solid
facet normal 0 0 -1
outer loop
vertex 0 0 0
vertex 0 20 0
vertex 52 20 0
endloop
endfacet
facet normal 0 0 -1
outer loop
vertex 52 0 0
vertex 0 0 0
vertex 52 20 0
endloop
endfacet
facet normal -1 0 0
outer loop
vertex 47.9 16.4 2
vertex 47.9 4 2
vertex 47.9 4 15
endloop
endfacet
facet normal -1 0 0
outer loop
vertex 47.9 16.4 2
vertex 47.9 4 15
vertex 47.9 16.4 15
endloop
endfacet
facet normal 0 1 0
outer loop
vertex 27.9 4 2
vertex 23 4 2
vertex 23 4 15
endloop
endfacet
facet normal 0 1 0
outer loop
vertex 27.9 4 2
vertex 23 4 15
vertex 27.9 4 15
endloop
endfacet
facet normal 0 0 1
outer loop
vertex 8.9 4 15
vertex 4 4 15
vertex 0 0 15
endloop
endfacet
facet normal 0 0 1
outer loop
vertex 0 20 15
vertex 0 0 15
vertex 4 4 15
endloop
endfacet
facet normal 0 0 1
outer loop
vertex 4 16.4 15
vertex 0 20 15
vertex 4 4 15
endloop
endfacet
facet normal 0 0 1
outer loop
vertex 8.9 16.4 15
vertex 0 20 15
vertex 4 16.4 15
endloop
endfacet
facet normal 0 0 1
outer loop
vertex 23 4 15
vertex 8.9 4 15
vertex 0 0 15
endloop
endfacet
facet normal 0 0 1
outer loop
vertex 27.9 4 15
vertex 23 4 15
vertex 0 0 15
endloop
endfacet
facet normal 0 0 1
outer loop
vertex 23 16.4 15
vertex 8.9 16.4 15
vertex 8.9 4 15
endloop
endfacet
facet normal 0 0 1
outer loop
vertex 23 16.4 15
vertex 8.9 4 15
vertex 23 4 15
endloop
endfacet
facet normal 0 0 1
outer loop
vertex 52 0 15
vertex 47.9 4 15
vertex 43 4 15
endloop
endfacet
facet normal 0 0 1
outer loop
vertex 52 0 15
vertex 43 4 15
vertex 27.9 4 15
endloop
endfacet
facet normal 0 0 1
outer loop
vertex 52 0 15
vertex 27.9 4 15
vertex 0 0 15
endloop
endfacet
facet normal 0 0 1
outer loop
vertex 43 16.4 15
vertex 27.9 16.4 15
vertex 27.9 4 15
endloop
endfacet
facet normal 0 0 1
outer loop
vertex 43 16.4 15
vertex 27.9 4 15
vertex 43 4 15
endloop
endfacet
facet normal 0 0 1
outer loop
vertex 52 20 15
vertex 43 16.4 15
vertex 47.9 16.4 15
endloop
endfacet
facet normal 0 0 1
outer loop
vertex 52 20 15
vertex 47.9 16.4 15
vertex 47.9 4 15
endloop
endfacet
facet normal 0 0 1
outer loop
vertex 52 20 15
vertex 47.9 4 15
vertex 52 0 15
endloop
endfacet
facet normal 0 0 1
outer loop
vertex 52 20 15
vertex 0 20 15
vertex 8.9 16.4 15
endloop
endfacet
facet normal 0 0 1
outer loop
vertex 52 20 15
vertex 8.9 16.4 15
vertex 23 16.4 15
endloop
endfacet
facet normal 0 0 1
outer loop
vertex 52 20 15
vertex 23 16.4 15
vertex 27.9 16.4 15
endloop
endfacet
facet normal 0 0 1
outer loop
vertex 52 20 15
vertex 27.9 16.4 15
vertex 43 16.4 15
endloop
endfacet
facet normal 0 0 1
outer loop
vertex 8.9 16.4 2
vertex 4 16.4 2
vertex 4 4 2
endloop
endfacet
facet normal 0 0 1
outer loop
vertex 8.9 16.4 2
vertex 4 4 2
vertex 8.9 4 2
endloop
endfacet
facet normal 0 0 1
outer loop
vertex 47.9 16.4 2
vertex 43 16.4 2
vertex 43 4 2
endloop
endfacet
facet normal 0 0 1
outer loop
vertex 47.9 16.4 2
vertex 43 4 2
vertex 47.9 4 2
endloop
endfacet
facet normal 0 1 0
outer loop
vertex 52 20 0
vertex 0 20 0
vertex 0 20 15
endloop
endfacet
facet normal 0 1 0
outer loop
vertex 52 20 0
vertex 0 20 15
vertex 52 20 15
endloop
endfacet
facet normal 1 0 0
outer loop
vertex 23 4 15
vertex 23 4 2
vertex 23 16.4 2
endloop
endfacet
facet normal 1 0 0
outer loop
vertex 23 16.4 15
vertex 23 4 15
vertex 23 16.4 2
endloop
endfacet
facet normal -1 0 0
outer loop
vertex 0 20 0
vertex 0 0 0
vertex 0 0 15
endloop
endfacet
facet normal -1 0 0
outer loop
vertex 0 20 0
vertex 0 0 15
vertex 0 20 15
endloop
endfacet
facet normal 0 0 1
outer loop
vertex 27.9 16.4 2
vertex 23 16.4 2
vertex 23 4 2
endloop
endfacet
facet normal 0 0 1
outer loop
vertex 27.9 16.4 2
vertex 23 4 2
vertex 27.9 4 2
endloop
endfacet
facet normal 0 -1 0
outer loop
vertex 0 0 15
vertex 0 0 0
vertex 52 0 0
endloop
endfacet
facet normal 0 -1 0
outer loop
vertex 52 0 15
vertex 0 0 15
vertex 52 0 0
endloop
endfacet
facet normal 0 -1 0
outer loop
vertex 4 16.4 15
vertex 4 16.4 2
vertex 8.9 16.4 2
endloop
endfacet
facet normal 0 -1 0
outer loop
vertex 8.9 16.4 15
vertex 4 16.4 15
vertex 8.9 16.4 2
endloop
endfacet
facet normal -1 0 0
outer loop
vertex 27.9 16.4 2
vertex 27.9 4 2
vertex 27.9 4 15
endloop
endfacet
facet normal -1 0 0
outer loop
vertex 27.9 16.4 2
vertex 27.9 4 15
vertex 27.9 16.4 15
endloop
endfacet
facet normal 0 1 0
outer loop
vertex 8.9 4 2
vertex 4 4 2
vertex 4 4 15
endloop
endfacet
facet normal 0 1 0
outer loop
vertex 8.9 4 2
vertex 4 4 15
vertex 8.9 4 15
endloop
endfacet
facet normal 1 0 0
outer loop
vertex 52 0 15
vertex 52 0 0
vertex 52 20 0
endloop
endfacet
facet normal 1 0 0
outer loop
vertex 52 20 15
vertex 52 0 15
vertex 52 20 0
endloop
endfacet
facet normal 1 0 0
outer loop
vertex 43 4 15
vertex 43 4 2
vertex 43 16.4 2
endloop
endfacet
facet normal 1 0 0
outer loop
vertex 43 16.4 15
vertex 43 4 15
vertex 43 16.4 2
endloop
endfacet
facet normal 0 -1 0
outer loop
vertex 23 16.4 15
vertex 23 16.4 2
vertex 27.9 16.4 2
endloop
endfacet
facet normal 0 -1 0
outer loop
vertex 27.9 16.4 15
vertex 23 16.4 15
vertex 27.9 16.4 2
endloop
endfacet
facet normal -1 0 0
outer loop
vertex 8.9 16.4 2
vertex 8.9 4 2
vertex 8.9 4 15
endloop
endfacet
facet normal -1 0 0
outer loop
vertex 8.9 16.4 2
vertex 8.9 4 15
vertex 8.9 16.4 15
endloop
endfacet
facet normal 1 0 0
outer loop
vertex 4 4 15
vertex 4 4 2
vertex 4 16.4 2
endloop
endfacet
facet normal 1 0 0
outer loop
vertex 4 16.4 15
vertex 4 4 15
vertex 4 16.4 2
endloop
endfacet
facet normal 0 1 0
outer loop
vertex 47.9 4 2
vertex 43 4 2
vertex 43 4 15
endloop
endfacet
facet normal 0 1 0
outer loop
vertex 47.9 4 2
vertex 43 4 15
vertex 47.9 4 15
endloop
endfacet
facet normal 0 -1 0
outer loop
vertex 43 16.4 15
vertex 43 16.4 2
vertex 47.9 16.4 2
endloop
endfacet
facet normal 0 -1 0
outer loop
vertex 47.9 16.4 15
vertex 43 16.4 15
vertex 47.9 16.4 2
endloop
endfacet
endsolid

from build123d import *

# Parameters (mm, degrees)
BOX003_W     = 4.9
BOX003_H     = 12.4
BOX003_DEPTH = 25
BOX002_W     = 4.9
BOX002_H     = 12.4
BOX002_DEPTH = 25
BOX001_W     = 4.9
BOX001_H     = 12.4
BOX001_DEPTH = 25
BOX_W        = 52
BOX_H        = 20
BOX_DEPTH    = 15


with BuildPart() as box003:
    # Box003 → Box003 (new body)
    with BuildSketch(Plane(origin=(23, 4, 2), x_dir=(1, 0, 0), z_dir=(0, 0, 1))):
        with Locations((2.45, 6.2)):
            Rectangle(BOX003_W, BOX003_H)
    extrude(amount=BOX003_DEPTH)


with BuildPart() as box002:
    # Box002 → Box002 (new body)
    with BuildSketch(Plane(origin=(43, 4, 2), x_dir=(1, 0, 0), z_dir=(0, 0, 1))):
        with Locations((2.45, 6.2)):
            Rectangle(BOX002_W, BOX002_H)
    extrude(amount=BOX002_DEPTH)


with BuildPart() as box001:
    # Box001 → Box001 (new body)
    with BuildSketch(Plane(origin=(4, 4, 2), x_dir=(1, 0, 0), z_dir=(0, 0, 1))):
        with Locations((2.45, 6.2)):
            Rectangle(BOX001_W, BOX001_H)
    extrude(amount=BOX001_DEPTH)


with BuildPart() as cut002:
    # Box → Box (new body)
    with BuildSketch(Plane.XY):
        with Locations((26, 10)):
            Rectangle(BOX_W, BOX_H)
    extrude(amount=BOX_DEPTH)

    # Cut: cut Box001
    add(box001.part, mode=Mode.SUBTRACT)

    # Cut001: cut Box002
    add(box002.part, mode=Mode.SUBTRACT)

    # Cut002: cut Box003
    add(box003.part, mode=Mode.SUBTRACT)


solid = cut002.part
